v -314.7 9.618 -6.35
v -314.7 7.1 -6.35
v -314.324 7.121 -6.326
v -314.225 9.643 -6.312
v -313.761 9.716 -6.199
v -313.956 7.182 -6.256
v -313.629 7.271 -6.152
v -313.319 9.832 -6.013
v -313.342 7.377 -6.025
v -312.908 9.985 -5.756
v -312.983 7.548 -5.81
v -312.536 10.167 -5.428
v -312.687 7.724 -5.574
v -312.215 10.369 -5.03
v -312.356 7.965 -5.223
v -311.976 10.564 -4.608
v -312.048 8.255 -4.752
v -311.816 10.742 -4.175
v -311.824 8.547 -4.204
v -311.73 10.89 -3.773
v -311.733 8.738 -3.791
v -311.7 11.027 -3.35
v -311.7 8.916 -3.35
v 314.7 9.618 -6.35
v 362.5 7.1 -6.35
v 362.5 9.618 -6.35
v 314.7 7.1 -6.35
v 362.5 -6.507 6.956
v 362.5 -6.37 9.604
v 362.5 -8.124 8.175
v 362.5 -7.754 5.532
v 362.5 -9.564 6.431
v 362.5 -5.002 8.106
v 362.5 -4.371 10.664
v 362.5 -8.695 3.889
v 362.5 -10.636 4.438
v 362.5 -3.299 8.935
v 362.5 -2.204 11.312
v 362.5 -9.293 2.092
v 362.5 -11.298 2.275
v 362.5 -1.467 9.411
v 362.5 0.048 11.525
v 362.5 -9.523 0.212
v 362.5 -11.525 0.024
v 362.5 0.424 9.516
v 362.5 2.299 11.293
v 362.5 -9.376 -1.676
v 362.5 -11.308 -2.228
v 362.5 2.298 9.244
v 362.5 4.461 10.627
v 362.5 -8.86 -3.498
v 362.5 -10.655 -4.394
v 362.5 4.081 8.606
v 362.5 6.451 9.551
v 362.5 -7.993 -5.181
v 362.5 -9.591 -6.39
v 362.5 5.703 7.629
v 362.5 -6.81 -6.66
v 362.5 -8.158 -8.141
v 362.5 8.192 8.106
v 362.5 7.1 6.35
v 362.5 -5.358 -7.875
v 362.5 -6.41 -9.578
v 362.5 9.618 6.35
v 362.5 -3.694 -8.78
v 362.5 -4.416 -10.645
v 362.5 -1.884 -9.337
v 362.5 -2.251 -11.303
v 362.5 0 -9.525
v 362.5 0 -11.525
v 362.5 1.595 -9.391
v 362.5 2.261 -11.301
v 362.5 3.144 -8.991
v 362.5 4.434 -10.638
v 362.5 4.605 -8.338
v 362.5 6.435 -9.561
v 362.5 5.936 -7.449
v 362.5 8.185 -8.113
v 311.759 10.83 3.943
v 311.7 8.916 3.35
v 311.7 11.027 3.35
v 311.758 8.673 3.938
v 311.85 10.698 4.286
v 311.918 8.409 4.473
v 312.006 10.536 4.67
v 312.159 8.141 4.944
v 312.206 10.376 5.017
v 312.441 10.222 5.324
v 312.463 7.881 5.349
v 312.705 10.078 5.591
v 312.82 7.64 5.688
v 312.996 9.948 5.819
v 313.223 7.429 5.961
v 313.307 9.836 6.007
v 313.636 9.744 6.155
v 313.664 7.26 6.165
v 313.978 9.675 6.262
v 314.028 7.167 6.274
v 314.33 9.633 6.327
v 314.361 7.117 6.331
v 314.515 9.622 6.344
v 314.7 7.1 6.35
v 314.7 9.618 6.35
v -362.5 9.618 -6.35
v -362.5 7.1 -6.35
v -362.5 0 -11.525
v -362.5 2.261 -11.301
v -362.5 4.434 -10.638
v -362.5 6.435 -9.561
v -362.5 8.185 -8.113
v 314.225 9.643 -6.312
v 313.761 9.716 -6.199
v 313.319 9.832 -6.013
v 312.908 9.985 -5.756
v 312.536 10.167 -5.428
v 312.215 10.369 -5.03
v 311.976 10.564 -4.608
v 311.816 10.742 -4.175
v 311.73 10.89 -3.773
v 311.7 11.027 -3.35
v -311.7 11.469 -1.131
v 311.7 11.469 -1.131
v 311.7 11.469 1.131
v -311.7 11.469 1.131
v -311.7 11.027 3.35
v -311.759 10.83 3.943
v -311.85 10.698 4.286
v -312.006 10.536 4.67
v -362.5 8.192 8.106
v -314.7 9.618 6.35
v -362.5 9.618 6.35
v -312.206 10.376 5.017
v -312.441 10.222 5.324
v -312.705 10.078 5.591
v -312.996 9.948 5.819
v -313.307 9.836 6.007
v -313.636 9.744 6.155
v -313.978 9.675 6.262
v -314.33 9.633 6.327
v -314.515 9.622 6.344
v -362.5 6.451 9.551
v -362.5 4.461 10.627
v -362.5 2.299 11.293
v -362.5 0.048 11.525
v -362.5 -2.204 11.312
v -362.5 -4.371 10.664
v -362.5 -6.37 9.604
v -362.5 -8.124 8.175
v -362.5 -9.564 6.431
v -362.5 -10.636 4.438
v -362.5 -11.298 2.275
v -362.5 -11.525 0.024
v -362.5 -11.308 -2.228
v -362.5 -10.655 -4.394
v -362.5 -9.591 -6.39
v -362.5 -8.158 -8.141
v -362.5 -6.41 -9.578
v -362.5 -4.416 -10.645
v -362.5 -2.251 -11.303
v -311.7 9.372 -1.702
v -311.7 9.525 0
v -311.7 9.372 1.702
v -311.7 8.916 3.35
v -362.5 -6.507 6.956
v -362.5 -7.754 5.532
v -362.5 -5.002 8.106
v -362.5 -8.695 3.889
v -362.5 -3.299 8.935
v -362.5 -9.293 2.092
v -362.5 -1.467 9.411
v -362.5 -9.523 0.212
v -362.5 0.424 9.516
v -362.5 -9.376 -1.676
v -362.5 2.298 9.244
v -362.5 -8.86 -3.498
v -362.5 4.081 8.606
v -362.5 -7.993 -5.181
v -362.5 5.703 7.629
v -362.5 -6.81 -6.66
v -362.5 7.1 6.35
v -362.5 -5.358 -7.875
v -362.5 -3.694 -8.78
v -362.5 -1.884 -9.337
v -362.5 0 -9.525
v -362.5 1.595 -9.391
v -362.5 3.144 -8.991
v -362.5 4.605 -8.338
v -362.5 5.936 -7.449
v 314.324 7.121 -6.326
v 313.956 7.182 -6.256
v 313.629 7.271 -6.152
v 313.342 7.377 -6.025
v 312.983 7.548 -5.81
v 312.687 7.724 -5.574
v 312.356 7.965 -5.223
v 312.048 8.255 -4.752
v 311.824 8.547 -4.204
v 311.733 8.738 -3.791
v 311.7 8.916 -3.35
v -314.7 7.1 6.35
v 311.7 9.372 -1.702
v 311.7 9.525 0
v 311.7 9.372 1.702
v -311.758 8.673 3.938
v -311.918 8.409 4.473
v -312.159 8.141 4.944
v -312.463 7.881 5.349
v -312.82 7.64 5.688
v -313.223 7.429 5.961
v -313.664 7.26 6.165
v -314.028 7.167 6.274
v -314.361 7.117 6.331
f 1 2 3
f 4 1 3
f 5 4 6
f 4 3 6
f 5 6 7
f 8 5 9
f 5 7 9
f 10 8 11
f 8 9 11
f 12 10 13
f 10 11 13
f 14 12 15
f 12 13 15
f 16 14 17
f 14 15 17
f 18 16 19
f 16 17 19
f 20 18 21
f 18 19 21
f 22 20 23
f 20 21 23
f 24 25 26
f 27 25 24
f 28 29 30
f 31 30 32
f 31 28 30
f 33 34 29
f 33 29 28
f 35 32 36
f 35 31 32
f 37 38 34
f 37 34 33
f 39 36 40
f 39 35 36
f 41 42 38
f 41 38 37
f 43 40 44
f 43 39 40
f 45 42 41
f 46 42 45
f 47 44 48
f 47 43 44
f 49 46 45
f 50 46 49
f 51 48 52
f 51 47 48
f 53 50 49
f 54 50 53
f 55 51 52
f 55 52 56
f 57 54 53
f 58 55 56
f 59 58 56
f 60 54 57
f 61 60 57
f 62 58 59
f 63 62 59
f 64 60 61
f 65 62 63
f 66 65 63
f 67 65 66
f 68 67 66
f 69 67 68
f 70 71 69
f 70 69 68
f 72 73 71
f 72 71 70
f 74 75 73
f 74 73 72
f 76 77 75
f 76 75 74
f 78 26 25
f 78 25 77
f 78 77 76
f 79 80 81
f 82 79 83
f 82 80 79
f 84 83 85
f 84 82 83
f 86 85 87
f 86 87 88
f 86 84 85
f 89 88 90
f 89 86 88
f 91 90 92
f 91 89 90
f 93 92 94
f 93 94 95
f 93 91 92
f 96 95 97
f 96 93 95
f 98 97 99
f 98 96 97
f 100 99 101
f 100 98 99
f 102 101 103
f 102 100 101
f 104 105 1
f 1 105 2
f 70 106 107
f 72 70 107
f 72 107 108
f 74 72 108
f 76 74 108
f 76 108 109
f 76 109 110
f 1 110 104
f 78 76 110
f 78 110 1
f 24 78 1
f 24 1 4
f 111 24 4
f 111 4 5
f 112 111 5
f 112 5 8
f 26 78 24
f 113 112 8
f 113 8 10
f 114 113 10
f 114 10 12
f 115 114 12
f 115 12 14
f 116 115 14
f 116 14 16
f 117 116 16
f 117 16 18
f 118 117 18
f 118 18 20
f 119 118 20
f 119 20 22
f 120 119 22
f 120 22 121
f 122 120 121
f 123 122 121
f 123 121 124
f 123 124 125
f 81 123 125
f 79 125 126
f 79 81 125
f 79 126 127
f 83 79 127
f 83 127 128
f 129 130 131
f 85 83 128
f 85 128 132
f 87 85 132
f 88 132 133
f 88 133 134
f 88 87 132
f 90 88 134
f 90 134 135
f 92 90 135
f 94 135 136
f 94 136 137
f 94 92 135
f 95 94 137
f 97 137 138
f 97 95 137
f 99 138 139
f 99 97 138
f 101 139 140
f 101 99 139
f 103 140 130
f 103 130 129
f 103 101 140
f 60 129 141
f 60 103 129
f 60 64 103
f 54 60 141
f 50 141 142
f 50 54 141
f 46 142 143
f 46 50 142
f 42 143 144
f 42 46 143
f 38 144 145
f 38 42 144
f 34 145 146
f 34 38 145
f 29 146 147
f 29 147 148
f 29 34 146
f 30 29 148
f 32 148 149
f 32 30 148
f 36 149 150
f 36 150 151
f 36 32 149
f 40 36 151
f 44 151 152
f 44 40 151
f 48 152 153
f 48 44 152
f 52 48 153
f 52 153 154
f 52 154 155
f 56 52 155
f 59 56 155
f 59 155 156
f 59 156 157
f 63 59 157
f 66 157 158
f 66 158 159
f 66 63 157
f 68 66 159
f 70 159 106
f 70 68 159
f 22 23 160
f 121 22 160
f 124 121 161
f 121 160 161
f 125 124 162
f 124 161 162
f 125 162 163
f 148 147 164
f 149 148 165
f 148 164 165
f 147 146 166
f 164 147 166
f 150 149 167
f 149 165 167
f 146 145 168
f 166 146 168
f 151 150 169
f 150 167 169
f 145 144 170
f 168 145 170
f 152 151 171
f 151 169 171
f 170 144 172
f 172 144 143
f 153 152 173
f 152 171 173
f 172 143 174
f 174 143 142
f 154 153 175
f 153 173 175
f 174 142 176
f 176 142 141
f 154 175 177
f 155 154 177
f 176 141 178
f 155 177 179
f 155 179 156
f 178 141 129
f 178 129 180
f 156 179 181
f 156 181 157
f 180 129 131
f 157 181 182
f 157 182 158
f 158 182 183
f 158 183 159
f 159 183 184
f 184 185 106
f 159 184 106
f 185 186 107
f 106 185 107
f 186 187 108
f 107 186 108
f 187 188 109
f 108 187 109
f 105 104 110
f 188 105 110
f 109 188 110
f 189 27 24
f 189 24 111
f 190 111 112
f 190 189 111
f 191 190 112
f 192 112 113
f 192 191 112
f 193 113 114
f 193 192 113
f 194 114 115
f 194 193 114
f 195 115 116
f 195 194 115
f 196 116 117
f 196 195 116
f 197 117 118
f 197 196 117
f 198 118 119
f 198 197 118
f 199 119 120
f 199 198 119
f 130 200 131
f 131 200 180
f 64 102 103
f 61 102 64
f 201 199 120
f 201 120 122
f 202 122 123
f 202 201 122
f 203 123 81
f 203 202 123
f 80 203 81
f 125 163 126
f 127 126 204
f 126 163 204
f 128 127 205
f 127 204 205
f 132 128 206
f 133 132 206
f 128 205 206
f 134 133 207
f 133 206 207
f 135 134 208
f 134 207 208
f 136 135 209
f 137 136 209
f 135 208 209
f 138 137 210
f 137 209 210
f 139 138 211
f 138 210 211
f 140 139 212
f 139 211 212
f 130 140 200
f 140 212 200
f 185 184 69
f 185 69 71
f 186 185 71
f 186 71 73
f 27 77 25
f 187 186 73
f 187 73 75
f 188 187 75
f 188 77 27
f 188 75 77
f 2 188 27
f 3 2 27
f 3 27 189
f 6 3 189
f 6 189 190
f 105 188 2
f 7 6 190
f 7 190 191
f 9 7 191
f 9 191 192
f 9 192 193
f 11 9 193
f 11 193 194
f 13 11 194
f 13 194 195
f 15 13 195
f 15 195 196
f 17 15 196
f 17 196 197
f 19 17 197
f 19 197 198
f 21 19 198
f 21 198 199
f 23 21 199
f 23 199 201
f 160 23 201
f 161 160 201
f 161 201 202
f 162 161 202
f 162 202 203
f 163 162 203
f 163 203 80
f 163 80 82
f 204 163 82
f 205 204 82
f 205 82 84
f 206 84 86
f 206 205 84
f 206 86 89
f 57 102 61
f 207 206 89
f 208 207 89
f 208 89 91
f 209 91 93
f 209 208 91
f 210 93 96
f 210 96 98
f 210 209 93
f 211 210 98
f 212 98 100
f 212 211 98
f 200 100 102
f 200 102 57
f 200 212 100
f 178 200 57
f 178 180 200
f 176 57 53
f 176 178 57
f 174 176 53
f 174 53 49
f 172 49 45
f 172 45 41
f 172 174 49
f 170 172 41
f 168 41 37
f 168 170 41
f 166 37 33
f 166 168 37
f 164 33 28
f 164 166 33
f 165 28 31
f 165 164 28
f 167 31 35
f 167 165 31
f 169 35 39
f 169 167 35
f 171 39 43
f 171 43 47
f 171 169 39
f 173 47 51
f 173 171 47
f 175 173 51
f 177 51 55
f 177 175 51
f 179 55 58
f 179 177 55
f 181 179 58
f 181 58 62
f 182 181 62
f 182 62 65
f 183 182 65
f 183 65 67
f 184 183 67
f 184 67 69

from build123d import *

# Parameters (mm, degrees)
SKETCH1_R           = 11.525
SKETCH1_R_2         = 9.525
EXTRUDE_THIN1_DEPTH = 362.5
CUT_EXTRUDE1_DEPTH  = 23


with BuildPart() as part:
    # Sketch1 → Extrude-Thin1 (new, symmetric)
    with BuildSketch(Plane(origin=(0, 0, 0), x_dir=(0, 0, -1), z_dir=(1, 0, 0))):
        Circle(SKETCH1_R)
        Circle(SKETCH1_R_2, mode=Mode.SUBTRACT)
    extrude(amount=EXTRUDE_THIN1_DEPTH, both=True)

    # Sketch2 → Cut-Extrude1 (cut)
    with BuildSketch(Plane(origin=(0, 0, 0), x_dir=(1, 0, 0), z_dir=(0, 1, 0))):
        with BuildLine():
            Line((314.7, -6.35), (362.5, -6.35))
            Line((362.5, -6.35), (362.5, 6.35))
            Line((362.5, 6.35), (314.7, 6.35))
            ThreePointArc((314.7, 6.35), (312.578679656, 5.471320344), (311.7, 3.35))
            Line((311.7, 3.35), (311.7, -3.35))
            ThreePointArc((311.7, -3.35), (312.578679656, -5.471320344), (314.7, -6.35))
        make_face()
    cut_extrude1 = extrude(amount=CUT_EXTRUDE1_DEPTH, mode=Mode.SUBTRACT)

    # Mirror1: Cut-Extrude1 across plane
    add(cut_extrude1.mirror(Plane(origin=(0, 0, 0), x_dir=(0, 0, 1), z_dir=(1, 0, 0))), mode=Mode.SUBTRACT)


solid = part.part
